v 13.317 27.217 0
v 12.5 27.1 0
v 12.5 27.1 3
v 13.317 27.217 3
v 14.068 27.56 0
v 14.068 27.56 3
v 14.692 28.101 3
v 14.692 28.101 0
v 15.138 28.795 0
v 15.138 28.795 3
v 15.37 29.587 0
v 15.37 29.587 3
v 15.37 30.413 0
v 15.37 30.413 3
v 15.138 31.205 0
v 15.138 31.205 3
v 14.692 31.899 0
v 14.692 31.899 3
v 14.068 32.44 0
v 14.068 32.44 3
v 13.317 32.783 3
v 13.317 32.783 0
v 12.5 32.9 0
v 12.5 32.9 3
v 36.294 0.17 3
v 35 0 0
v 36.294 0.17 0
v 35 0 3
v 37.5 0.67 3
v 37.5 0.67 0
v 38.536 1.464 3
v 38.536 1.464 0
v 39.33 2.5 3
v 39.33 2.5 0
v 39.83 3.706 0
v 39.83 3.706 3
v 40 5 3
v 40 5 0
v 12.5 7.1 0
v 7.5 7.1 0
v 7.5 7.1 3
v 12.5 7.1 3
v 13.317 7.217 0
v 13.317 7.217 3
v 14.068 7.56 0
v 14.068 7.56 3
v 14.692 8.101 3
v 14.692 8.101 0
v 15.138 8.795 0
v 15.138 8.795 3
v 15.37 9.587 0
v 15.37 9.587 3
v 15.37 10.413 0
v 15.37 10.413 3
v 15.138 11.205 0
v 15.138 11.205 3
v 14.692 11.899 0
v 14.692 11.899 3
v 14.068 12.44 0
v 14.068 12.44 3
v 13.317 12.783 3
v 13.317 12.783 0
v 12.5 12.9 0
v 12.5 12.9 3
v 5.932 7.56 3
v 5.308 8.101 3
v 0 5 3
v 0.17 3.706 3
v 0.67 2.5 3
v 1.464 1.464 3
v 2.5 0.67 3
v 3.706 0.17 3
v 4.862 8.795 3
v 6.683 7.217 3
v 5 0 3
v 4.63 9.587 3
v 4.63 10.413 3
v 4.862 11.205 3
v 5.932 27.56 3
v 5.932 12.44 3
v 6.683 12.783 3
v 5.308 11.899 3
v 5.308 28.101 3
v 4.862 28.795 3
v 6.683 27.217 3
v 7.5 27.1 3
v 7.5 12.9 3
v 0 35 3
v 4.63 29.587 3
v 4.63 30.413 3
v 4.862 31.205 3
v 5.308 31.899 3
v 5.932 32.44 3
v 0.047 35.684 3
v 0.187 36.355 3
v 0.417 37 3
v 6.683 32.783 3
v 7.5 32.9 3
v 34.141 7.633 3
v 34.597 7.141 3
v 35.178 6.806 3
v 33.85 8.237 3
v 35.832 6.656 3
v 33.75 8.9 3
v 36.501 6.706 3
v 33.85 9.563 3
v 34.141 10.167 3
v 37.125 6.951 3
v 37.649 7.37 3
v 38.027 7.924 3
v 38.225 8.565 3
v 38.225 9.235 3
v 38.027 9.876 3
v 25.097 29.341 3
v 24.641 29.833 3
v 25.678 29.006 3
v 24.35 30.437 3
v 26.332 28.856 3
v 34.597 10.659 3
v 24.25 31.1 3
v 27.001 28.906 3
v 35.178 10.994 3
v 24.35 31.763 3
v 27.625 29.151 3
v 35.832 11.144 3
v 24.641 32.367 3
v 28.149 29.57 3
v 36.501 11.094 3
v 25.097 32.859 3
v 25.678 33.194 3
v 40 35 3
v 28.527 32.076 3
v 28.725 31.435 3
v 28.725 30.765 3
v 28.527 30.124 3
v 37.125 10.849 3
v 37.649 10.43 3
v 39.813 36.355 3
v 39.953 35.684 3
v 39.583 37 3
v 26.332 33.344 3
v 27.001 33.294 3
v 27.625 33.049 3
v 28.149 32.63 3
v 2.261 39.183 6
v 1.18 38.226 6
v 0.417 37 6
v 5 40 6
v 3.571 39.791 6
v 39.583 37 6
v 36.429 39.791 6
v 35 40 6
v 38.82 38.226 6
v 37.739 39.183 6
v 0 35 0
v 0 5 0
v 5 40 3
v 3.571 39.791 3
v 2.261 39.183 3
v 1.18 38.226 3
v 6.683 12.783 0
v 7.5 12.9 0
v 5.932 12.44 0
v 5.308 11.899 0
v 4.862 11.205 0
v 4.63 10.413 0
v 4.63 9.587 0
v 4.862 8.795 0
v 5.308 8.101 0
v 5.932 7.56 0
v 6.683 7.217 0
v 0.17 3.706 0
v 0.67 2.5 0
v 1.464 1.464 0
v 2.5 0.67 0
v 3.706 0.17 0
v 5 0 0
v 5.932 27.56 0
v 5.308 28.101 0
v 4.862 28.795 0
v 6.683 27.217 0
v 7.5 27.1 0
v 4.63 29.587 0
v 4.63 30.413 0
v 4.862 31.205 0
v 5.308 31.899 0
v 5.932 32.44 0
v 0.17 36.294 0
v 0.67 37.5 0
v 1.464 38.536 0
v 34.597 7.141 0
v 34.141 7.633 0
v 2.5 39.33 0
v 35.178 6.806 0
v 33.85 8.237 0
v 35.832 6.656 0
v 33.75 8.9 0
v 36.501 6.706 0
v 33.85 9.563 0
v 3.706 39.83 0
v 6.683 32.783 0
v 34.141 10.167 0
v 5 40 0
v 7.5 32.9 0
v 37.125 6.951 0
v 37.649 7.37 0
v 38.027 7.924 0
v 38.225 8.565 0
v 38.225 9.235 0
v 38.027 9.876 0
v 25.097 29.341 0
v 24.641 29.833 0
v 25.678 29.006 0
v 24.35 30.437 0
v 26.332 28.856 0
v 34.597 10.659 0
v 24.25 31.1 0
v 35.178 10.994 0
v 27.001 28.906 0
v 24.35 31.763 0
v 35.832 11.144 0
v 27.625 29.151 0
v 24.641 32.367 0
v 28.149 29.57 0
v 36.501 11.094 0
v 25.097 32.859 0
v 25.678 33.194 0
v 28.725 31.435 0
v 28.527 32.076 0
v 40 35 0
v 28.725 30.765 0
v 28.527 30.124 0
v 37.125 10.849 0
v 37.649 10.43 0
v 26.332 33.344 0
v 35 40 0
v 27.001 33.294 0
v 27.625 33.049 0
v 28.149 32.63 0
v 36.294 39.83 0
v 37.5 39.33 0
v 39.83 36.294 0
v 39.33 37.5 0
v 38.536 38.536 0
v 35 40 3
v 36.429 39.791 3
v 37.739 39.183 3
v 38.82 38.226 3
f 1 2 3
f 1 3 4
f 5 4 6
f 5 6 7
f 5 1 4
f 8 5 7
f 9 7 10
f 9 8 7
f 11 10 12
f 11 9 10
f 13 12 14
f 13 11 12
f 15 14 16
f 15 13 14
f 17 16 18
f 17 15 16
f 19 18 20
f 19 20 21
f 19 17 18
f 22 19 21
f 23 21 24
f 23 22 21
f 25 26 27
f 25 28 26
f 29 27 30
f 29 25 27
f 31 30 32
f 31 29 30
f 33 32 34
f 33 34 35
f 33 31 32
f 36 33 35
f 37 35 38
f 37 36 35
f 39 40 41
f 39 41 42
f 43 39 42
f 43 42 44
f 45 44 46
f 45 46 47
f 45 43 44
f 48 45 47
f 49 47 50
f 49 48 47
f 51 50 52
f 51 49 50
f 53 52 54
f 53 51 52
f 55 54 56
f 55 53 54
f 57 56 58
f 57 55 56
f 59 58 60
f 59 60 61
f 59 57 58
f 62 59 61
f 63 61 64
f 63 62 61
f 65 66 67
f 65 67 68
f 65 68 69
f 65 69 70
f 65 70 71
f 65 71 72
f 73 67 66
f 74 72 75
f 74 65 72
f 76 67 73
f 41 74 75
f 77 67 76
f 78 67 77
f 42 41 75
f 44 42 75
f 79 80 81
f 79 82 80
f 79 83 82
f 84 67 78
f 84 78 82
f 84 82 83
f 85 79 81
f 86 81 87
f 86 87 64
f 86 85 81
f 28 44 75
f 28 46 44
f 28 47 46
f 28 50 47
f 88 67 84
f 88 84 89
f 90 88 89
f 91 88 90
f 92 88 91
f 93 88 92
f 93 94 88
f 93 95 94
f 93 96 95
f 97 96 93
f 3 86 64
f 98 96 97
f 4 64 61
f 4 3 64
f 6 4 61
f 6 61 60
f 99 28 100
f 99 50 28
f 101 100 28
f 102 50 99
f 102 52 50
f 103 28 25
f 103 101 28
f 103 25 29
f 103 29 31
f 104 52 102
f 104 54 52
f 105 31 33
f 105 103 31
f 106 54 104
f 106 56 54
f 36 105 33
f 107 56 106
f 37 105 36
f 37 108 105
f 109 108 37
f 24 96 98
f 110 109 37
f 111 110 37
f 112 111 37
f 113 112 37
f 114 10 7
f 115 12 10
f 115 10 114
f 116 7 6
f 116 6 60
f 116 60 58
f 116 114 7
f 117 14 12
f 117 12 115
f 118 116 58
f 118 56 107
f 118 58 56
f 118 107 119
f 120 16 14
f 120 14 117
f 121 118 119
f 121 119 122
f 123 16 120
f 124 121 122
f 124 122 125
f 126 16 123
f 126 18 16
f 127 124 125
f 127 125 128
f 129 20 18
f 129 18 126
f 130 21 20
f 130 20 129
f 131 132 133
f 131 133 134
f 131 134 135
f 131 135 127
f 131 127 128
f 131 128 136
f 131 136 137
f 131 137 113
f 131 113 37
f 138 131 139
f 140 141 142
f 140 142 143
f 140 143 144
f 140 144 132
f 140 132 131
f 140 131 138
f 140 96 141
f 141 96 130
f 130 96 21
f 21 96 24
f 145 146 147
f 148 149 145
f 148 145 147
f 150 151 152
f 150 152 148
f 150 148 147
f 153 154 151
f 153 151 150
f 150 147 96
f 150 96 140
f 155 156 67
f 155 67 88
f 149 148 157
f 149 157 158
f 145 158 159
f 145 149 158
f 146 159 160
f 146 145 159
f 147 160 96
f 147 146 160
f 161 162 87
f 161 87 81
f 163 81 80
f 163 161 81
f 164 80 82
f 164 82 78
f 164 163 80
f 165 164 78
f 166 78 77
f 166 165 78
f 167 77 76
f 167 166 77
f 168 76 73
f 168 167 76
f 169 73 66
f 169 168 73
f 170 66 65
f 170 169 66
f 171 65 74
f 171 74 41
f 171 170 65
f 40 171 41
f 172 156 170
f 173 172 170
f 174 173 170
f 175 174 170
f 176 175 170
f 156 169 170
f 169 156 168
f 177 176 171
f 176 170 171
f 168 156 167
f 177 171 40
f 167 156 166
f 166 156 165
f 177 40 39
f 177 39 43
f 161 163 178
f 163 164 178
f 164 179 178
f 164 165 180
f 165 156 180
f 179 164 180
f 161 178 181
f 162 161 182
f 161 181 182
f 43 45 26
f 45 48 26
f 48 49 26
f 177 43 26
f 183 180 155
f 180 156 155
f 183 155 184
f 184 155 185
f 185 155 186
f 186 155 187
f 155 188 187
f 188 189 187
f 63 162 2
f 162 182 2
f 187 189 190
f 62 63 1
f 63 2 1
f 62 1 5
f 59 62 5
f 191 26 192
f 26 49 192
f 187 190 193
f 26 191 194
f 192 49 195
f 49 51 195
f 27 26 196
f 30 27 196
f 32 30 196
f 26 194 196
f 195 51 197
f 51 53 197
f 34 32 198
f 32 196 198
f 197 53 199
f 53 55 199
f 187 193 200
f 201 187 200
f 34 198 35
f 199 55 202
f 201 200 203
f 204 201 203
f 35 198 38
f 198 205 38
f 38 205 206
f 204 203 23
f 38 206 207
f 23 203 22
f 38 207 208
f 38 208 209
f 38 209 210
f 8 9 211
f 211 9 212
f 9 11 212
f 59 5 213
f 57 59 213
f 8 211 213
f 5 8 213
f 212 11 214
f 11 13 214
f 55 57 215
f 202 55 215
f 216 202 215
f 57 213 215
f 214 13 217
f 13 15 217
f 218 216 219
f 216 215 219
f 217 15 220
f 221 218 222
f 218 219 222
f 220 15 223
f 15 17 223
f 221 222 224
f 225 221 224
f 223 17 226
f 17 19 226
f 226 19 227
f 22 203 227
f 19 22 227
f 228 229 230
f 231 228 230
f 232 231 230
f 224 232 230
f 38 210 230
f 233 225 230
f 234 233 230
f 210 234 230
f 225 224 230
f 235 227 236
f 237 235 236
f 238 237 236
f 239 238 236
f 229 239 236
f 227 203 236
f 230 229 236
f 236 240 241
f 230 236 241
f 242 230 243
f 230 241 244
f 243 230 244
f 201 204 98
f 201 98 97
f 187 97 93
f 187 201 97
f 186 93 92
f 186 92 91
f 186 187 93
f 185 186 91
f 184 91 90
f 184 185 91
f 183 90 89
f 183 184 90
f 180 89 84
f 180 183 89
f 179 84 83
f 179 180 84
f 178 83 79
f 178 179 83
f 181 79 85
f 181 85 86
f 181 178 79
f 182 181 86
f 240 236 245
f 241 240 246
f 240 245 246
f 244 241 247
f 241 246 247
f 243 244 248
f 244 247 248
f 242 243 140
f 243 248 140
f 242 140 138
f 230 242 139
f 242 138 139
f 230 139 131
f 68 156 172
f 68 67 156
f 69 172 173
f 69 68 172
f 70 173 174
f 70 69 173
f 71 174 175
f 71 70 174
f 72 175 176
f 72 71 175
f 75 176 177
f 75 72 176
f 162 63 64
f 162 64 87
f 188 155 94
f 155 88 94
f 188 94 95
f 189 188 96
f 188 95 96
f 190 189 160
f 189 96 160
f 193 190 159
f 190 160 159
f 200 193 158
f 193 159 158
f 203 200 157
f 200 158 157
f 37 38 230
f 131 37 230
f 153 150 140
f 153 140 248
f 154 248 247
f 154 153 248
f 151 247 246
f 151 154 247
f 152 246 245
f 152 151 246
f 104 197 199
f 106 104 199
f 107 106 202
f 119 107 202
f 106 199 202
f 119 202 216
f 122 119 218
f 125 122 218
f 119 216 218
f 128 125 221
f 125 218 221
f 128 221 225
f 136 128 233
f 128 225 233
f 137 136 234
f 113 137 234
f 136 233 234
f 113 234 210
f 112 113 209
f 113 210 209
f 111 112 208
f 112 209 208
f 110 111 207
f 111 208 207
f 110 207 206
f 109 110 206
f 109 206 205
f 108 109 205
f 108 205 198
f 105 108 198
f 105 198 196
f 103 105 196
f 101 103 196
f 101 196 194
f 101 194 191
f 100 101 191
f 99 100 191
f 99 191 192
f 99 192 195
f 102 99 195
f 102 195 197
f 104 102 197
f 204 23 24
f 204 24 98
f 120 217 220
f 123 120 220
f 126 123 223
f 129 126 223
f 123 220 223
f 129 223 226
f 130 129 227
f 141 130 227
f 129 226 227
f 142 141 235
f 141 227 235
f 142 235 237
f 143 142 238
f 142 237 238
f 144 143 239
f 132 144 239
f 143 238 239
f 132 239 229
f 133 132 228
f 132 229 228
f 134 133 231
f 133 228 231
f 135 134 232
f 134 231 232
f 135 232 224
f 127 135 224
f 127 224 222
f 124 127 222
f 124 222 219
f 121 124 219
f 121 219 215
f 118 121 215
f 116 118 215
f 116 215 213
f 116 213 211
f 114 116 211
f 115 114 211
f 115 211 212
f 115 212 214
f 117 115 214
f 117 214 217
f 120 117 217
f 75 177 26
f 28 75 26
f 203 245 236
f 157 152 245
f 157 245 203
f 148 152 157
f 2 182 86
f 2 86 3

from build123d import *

# Parameters (mm, degrees)
SKETCH1_W                  = 40
SKETCH1_H                  = 40
BOSS_EXTRUDE1_DEPTH        = 3
F_4_5_4_5_DIAMETER_HOLE1_D = 4.5
M5_CLEARANCE_SLOT1_DEPTH   = 3
FILLET1_R                  = 5
BOSS_EXTRUDE2_START        = 3
BOSS_EXTRUDE2_DEPTH        = 3


# Read off the part's stored shape, not the designer's step: M5 Clearance Slot1
with BuildPart() as part:
    # Sketch1 → Boss-Extrude1 (new body)
    with BuildSketch(Plane.XY):
        with Locations((20, 20)):
            Rectangle(SKETCH1_W, SKETCH1_H)
    extrude(amount=BOSS_EXTRUDE1_DEPTH)

    # Ø4.5 (4.5) Diameter Hole1 (through all)
    with Locations(Plane.XY.offset(3)):
        with Locations((26.5, 31.1), (36, 8.9)):
            Hole(F_4_5_4_5_DIAMETER_HOLE1_D / 2)

    # M5 Clearance Slot1 outline → M5 Clearance Slot1 (cut)
    with BuildSketch(Plane.XY):
        with BuildLine():
            Line((7.5, 7.1), (12.5, 7.1))
            ThreePointArc((12.5, 7.1), (15.4, 10), (12.5, 12.9))
            Line((12.5, 12.9), (7.5, 12.9))
            ThreePointArc((7.5, 12.9), (4.6, 10), (7.5, 7.1))
        make_face()
        with BuildLine():
            Line((7.5, 27.1), (12.5, 27.1))
            ThreePointArc((12.5, 27.1), (15.4, 30), (12.5, 32.9))
            Line((12.5, 32.9), (7.5, 32.9))
            ThreePointArc((7.5, 32.9), (4.6, 30), (7.5, 27.1))
        make_face()
    extrude(amount=M5_CLEARANCE_SLOT1_DEPTH, mode=Mode.SUBTRACT)

    # Fillet1
    fillet1_edges = [part.edges().sort_by_distance(p)[0] for p in [
        (0, 40, 1.5),
        (40, 40, 1.5),
        (40, 0, 1.5),
        (0, 0, 1.5),
    ]]
    fillet(fillet1_edges, radius=FILLET1_R)

    # Sketch10 → Boss-Extrude2 (add)
    with BuildSketch(Plane.XY.offset(3).offset(BOSS_EXTRUDE2_START)):
        with BuildLine():
            Line((0.417424305, 37), (39.582575695, 37))
            ThreePointArc((39.582575695, 37), (37.738612788, 39.183300133), (35, 40))
            Line((35, 40), (5, 40))
            ThreePointArc((5, 40), (2.261387212, 39.183300133), (0.417424305, 37))
        make_face()
    extrude(amount=-BOSS_EXTRUDE2_DEPTH)


solid = part.part
